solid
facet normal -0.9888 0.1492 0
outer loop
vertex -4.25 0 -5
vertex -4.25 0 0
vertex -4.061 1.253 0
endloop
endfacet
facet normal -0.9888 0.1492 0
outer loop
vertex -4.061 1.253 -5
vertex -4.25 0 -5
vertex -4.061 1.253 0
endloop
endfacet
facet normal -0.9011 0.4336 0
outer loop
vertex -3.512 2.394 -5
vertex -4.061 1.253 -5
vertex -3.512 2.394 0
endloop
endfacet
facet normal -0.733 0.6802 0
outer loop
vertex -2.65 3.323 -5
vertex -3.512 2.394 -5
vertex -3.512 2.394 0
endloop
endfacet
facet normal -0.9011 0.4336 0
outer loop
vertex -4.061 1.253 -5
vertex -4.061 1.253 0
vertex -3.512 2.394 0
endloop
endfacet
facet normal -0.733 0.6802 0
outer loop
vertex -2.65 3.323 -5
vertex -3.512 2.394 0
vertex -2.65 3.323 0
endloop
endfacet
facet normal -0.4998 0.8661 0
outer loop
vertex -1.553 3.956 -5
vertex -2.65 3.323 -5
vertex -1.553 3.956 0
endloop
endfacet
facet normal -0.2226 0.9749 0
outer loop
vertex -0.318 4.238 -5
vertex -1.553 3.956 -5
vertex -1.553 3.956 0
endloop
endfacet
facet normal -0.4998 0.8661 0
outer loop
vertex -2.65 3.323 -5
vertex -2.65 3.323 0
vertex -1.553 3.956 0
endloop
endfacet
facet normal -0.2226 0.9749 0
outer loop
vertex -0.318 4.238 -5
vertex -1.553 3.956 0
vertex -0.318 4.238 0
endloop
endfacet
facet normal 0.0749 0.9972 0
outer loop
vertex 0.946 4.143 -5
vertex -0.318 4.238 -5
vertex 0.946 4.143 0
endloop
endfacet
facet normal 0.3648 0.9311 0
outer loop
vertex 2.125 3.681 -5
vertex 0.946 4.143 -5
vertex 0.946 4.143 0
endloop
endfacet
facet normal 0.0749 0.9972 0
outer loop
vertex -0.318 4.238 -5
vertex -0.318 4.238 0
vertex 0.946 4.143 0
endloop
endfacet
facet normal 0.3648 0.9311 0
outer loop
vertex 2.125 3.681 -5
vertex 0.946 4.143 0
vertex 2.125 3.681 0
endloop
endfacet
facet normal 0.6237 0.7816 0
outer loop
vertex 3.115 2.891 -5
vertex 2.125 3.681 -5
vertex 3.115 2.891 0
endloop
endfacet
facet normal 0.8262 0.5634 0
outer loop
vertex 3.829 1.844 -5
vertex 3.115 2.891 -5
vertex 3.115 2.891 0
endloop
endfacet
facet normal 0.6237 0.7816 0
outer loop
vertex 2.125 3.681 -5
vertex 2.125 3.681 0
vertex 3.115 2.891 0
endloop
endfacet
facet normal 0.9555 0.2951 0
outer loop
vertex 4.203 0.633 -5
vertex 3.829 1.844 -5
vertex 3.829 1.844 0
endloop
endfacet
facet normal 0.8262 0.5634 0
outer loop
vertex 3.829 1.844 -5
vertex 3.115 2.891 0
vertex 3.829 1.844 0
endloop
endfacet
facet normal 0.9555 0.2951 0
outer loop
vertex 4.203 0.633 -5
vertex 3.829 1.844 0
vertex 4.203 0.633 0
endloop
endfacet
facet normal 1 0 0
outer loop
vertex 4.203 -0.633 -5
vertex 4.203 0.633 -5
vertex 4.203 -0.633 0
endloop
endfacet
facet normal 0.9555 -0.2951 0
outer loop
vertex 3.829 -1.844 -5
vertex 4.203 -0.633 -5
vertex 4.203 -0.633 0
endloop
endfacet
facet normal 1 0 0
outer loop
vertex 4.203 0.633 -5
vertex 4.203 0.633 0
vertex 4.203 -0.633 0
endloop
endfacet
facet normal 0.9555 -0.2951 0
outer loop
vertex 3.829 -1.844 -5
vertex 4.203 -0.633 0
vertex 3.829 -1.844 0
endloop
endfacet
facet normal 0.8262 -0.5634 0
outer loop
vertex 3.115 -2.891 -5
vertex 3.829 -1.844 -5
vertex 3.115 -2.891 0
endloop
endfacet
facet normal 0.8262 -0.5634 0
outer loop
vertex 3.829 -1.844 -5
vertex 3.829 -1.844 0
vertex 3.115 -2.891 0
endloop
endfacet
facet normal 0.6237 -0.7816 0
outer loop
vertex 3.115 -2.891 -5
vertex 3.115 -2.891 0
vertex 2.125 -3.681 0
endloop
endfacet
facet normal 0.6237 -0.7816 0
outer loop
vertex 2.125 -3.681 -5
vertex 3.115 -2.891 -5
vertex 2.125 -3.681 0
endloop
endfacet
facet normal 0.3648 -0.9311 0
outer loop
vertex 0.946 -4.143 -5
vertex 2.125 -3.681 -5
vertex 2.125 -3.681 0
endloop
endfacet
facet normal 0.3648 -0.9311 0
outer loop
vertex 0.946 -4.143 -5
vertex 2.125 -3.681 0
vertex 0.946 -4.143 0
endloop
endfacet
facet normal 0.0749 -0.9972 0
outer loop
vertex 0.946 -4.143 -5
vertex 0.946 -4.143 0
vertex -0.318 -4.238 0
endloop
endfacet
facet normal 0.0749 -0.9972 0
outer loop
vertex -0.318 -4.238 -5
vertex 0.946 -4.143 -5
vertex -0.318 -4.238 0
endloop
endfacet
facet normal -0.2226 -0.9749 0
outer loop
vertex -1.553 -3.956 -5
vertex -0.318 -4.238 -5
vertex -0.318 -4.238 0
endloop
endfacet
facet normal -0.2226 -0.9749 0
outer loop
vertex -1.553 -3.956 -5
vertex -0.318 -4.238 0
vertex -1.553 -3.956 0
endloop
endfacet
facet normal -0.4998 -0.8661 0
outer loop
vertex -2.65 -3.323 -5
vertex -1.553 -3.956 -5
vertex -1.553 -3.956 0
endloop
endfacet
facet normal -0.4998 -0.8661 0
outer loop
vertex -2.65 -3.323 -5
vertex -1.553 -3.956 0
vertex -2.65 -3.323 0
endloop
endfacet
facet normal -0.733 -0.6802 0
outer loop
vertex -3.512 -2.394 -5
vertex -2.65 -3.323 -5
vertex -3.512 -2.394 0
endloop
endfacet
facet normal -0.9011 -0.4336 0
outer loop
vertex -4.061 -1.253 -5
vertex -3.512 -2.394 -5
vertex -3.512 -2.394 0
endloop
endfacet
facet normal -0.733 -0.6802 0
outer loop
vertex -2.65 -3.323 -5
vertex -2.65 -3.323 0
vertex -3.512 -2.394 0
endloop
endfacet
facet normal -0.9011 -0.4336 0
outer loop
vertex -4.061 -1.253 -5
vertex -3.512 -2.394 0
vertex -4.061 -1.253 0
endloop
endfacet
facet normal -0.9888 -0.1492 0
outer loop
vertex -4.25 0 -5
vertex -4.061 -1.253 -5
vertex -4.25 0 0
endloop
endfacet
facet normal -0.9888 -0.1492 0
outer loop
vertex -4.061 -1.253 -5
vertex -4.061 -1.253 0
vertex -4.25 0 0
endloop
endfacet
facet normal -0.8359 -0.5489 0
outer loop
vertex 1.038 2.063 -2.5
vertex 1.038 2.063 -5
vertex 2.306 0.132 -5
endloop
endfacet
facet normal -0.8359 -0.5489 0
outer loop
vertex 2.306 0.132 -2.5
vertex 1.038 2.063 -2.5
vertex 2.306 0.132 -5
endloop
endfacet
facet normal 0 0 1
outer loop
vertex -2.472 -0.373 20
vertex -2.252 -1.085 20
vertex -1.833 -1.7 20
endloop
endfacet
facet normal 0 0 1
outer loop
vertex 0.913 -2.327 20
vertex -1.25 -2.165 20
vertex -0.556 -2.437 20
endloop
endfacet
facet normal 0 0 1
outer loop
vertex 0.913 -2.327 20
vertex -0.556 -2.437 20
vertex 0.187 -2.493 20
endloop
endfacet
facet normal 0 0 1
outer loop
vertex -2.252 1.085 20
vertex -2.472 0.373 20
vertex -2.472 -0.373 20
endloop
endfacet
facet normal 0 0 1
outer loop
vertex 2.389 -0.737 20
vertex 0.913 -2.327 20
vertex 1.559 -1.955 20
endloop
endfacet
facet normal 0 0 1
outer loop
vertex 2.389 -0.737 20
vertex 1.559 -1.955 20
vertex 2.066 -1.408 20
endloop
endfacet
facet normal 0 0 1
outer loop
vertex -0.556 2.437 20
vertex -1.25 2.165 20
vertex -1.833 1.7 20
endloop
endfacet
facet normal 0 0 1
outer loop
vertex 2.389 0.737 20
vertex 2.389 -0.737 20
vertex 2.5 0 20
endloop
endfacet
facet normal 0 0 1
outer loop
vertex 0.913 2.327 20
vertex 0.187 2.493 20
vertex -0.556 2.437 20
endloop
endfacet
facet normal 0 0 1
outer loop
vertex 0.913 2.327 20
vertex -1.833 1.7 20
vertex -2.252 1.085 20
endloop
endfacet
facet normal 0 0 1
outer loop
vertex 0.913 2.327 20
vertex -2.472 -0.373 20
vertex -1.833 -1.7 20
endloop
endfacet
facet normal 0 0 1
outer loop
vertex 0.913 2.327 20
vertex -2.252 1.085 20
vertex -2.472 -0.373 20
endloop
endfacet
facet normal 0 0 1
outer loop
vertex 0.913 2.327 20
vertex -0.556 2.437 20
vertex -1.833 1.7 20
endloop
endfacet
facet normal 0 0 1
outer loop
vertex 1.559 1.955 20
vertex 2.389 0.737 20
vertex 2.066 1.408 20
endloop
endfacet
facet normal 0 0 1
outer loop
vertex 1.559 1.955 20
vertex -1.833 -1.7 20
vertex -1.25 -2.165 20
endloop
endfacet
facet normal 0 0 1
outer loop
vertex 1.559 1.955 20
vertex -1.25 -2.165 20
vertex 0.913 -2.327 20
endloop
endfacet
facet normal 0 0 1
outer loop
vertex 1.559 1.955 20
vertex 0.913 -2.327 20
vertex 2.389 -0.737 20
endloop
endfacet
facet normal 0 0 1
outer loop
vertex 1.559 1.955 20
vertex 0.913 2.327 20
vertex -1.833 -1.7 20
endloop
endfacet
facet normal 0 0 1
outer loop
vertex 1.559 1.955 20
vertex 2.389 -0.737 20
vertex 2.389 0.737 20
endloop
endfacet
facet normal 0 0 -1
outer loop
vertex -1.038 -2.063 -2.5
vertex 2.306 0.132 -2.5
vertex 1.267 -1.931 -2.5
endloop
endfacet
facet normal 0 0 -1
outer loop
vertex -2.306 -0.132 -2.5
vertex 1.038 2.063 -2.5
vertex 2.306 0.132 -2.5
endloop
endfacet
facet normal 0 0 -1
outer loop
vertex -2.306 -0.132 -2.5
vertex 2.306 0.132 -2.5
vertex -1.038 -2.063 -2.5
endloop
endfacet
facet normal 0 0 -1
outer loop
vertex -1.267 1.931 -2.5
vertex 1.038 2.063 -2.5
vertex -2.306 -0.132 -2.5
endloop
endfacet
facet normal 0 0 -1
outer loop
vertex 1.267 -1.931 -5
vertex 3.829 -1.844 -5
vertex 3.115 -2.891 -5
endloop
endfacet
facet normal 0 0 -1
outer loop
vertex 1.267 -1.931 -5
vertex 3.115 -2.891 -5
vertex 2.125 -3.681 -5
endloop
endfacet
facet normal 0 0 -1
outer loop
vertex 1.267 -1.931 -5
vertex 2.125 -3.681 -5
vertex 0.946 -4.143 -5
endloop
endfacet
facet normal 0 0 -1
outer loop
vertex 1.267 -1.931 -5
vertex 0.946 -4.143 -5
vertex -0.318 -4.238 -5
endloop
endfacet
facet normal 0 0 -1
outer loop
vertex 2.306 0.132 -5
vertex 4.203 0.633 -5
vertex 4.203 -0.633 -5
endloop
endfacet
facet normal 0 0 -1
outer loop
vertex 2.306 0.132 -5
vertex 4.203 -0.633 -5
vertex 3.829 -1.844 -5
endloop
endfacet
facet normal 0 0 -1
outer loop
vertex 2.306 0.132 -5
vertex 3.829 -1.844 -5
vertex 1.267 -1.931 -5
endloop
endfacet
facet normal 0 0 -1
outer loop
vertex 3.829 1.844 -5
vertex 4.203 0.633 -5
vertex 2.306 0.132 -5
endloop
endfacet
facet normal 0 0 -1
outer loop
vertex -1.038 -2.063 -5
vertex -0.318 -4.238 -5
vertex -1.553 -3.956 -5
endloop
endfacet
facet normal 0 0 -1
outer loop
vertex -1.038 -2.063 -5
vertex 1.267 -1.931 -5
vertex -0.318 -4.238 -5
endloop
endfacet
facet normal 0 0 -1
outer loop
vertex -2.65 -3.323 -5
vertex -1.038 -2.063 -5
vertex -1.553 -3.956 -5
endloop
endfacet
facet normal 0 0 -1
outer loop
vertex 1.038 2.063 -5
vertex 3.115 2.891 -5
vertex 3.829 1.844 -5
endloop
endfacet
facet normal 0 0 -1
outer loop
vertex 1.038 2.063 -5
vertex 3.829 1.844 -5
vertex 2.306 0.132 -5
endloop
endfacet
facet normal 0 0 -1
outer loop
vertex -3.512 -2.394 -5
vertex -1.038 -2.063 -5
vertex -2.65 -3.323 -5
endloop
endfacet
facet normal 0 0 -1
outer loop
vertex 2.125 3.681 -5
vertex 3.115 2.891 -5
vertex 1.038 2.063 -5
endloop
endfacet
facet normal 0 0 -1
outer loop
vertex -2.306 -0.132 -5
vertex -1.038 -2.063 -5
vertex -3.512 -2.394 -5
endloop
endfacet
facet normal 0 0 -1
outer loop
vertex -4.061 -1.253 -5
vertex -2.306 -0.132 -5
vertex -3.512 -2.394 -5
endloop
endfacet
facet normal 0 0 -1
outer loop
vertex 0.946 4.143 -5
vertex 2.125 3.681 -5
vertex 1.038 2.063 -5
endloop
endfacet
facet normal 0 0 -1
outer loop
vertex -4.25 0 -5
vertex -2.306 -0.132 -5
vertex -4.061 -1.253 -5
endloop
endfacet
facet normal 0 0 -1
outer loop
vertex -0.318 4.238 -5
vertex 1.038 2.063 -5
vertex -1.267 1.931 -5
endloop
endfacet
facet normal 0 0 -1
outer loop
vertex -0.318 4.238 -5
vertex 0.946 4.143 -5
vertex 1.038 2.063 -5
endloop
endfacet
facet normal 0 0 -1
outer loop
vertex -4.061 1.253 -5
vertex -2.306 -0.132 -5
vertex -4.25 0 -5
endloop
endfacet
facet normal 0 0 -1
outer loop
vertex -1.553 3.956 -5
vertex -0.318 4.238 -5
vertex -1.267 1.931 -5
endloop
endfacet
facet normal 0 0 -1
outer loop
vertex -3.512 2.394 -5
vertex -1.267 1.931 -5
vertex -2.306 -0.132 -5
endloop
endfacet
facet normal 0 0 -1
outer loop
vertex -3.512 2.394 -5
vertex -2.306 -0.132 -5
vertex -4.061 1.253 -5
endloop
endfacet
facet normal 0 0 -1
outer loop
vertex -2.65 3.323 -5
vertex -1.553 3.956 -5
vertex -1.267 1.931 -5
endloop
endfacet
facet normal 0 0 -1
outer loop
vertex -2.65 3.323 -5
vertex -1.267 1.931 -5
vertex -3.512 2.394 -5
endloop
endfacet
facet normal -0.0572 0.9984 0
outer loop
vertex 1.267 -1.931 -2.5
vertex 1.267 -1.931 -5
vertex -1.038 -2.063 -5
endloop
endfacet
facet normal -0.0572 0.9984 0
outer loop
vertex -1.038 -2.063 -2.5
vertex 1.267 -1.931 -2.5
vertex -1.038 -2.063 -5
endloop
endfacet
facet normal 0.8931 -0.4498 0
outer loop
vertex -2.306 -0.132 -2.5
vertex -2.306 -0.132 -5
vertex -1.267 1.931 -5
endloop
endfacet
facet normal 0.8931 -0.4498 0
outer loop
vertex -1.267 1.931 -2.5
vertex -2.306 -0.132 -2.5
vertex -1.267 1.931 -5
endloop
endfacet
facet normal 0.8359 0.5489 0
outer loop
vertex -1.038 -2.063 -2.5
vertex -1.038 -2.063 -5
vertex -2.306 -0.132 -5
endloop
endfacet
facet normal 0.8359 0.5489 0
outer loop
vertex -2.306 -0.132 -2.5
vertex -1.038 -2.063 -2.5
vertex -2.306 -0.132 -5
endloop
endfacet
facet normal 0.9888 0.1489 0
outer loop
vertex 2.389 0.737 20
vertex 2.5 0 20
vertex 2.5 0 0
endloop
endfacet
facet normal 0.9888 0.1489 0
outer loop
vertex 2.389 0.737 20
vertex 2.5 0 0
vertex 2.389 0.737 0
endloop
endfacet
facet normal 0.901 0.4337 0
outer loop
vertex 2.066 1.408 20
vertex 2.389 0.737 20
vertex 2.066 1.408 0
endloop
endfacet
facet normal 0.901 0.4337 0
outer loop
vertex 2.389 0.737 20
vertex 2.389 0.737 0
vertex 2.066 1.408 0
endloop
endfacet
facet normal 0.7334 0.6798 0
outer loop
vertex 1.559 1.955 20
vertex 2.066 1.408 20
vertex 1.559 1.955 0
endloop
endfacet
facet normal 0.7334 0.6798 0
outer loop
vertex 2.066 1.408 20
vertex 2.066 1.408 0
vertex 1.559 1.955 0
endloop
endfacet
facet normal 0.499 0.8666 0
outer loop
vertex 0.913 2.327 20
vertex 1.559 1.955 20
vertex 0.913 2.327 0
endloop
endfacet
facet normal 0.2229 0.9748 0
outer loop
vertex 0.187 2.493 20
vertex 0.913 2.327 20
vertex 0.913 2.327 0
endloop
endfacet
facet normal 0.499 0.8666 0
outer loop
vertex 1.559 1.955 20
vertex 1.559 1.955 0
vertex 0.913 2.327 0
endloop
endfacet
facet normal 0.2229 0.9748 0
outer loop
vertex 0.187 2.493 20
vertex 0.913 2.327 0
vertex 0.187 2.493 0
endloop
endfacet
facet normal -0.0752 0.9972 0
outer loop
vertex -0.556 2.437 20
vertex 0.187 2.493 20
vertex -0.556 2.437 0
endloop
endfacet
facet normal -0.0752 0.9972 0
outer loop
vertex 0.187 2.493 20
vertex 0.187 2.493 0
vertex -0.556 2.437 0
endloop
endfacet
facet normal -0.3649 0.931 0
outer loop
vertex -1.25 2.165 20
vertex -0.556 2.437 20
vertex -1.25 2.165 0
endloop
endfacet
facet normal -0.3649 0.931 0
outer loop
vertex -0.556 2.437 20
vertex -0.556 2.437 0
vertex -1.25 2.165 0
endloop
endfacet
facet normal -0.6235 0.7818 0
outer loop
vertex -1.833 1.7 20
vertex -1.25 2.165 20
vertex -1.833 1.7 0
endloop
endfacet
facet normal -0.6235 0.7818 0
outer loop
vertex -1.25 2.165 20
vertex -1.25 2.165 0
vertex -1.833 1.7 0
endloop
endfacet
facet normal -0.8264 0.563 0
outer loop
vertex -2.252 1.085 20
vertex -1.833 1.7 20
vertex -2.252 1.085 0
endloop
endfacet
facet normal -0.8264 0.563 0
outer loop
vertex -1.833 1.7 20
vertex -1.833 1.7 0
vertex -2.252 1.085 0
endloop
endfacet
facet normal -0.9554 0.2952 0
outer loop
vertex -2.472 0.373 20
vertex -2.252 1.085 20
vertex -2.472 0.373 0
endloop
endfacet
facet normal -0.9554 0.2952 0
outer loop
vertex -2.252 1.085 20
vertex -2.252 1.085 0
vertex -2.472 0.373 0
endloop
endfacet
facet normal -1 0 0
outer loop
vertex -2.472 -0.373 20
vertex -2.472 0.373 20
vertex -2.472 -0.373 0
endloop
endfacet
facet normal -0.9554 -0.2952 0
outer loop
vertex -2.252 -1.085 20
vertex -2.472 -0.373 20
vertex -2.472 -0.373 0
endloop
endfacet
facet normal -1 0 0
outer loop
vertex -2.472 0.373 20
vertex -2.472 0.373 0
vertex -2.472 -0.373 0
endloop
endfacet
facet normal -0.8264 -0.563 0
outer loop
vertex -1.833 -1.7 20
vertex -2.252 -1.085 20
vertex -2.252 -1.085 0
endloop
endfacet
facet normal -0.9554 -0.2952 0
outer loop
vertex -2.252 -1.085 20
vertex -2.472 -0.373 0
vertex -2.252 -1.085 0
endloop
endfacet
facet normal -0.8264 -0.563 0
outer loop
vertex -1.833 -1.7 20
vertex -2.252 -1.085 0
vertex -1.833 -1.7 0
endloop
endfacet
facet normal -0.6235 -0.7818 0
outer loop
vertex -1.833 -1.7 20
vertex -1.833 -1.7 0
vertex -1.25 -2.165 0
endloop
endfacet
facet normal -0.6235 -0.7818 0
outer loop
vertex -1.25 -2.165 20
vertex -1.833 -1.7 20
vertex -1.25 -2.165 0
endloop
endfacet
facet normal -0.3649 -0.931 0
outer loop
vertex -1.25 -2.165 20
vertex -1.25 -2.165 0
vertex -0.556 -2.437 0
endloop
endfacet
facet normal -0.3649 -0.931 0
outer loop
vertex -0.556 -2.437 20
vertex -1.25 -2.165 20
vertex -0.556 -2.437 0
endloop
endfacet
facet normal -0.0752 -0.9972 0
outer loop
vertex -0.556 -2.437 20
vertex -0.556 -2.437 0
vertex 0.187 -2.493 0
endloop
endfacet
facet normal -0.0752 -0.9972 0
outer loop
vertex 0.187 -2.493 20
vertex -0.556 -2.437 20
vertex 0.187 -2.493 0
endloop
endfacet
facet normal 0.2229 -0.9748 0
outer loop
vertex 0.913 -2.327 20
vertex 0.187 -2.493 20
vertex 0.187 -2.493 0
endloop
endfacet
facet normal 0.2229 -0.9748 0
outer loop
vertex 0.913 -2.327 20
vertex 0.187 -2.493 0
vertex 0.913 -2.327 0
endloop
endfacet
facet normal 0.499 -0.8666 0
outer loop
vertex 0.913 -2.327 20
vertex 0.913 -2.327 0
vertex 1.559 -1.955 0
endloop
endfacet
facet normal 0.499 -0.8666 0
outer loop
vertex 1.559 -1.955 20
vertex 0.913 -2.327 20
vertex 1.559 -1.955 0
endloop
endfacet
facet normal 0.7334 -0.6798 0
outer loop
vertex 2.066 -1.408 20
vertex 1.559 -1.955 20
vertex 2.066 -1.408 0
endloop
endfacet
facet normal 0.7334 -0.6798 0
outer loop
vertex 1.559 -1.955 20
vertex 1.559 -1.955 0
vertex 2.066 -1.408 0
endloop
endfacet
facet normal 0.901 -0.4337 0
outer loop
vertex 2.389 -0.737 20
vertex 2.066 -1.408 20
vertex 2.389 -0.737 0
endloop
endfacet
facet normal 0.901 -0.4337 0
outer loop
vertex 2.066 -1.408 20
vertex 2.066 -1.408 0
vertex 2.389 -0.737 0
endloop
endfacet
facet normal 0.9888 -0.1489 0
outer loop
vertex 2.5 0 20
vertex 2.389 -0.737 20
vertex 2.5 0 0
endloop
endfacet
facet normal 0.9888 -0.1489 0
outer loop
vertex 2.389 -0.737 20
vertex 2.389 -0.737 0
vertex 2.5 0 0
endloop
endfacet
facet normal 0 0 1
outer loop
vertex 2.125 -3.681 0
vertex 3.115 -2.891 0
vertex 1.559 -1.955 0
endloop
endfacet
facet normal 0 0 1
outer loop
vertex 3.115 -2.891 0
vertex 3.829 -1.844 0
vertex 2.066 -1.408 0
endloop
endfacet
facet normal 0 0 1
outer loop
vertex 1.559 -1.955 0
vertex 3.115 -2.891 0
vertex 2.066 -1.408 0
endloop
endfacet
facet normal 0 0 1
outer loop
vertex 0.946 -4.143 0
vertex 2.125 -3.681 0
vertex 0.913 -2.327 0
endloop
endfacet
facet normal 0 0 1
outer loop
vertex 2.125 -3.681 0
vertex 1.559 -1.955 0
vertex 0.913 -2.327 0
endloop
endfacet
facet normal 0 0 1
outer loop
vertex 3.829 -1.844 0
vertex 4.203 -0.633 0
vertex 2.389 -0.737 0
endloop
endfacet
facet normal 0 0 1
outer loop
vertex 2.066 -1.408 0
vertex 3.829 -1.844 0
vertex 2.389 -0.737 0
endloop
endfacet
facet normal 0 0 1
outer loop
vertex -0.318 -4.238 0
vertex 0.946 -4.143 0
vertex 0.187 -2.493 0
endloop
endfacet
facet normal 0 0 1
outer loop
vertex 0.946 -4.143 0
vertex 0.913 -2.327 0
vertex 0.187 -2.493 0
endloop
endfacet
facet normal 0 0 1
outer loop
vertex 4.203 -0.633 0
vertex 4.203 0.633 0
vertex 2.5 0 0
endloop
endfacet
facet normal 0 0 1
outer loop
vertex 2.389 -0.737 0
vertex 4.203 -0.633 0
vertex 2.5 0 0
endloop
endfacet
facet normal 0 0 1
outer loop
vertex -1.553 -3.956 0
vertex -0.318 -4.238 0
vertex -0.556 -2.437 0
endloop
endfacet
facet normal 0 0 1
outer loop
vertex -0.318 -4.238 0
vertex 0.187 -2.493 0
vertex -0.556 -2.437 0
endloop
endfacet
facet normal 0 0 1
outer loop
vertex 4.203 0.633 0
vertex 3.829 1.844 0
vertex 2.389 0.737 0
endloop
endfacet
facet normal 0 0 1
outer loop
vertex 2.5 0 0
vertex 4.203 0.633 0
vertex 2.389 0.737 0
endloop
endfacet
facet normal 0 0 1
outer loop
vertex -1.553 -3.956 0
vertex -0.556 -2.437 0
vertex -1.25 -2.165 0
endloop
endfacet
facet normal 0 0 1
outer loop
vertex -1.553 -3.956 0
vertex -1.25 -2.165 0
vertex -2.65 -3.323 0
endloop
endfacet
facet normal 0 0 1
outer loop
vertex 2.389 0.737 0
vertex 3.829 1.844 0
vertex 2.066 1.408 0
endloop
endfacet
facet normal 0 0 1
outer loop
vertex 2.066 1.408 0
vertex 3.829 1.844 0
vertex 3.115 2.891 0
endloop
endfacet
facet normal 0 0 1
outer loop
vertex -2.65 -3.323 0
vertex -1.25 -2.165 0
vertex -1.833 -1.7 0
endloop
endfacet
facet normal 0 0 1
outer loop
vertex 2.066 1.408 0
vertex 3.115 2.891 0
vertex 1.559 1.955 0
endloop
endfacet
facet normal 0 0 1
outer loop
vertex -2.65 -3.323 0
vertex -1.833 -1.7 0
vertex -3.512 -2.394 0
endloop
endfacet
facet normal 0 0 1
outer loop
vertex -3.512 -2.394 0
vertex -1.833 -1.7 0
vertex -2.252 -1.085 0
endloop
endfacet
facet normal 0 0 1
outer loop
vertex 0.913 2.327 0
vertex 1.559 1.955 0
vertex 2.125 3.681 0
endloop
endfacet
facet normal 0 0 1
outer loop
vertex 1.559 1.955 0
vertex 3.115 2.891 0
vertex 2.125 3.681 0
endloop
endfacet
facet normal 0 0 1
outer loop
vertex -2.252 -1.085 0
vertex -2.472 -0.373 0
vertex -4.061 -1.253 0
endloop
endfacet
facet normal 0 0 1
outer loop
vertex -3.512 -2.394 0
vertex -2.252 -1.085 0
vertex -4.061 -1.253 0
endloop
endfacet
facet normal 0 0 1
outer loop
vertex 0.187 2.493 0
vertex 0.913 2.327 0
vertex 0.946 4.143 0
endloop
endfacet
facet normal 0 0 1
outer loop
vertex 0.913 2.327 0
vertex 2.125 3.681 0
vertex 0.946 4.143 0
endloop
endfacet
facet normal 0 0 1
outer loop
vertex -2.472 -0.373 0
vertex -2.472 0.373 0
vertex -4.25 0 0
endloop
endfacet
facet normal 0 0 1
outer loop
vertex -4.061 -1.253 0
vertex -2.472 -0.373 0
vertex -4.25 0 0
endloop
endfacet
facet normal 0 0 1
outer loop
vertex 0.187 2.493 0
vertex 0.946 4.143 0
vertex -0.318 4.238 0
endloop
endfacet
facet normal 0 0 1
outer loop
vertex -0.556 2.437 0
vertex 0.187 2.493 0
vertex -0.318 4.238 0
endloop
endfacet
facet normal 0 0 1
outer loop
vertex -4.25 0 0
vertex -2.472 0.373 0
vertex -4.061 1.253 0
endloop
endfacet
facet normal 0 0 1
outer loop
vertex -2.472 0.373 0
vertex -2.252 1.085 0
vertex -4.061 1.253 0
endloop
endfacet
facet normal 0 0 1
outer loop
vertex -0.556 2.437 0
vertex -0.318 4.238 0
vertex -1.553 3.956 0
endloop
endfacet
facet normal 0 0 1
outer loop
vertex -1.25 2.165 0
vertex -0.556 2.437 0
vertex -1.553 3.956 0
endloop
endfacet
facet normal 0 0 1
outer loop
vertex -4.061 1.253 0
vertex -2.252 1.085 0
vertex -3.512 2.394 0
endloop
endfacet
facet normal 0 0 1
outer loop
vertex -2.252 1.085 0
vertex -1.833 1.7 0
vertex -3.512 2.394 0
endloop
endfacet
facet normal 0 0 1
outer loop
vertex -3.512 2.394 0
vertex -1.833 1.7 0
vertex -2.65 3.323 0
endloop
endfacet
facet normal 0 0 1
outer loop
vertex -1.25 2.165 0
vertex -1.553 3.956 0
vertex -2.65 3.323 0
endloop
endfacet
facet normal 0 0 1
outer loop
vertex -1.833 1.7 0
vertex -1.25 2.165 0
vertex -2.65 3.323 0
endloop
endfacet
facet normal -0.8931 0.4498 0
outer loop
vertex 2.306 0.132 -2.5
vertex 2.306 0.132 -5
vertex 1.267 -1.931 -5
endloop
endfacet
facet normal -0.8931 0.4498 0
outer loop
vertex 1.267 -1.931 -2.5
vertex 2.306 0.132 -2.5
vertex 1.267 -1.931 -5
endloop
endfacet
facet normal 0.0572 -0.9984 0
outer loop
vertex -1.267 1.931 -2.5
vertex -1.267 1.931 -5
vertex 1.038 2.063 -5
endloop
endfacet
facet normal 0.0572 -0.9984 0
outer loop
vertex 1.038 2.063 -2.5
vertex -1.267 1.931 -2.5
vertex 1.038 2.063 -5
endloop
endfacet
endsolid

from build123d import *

# Parameters (mm, degrees)
CROQUIS1_R              = 2.5
SALIENTE_EXTRUIR1_DEPTH = 20
CROQUIS2_R              = 4.25
SALIENTE_EXTRUIR2_DEPTH = 5
CORTAR_EXTRUIR1_DEPTH   = 2.5


with BuildPart() as part:
    # Croquis1 → Saliente-Extruir1 (new body)
    with BuildSketch(Plane.XY):
        Circle(CROQUIS1_R)
    extrude(amount=SALIENTE_EXTRUIR1_DEPTH)

    # Croquis2 → Saliente-Extruir2 (add)
    with BuildSketch(Plane(origin=(0, 0, 0), x_dir=(-1, 0, 0), z_dir=(0, 0, -1))):
        Circle(CROQUIS2_R)
    extrude(amount=SALIENTE_EXTRUIR2_DEPTH)

    # Croquis3 → Cortar-Extruir1 (cut)
    with BuildSketch(Plane(origin=(0, 0, -5), x_dir=(-1, 0, 0), z_dir=(0, 0, -1))):
        Polygon((1.267478326, 1.93050046), (-1.038123277, 2.062918659), (-2.305601603, 0.132418199), (-1.267478326, -1.93050046), (1.038123277, -2.062918659), (2.305601603, -0.132418199), align=None)
    extrude(amount=-CORTAR_EXTRUIR1_DEPTH, mode=Mode.SUBTRACT)


solid = part.part
